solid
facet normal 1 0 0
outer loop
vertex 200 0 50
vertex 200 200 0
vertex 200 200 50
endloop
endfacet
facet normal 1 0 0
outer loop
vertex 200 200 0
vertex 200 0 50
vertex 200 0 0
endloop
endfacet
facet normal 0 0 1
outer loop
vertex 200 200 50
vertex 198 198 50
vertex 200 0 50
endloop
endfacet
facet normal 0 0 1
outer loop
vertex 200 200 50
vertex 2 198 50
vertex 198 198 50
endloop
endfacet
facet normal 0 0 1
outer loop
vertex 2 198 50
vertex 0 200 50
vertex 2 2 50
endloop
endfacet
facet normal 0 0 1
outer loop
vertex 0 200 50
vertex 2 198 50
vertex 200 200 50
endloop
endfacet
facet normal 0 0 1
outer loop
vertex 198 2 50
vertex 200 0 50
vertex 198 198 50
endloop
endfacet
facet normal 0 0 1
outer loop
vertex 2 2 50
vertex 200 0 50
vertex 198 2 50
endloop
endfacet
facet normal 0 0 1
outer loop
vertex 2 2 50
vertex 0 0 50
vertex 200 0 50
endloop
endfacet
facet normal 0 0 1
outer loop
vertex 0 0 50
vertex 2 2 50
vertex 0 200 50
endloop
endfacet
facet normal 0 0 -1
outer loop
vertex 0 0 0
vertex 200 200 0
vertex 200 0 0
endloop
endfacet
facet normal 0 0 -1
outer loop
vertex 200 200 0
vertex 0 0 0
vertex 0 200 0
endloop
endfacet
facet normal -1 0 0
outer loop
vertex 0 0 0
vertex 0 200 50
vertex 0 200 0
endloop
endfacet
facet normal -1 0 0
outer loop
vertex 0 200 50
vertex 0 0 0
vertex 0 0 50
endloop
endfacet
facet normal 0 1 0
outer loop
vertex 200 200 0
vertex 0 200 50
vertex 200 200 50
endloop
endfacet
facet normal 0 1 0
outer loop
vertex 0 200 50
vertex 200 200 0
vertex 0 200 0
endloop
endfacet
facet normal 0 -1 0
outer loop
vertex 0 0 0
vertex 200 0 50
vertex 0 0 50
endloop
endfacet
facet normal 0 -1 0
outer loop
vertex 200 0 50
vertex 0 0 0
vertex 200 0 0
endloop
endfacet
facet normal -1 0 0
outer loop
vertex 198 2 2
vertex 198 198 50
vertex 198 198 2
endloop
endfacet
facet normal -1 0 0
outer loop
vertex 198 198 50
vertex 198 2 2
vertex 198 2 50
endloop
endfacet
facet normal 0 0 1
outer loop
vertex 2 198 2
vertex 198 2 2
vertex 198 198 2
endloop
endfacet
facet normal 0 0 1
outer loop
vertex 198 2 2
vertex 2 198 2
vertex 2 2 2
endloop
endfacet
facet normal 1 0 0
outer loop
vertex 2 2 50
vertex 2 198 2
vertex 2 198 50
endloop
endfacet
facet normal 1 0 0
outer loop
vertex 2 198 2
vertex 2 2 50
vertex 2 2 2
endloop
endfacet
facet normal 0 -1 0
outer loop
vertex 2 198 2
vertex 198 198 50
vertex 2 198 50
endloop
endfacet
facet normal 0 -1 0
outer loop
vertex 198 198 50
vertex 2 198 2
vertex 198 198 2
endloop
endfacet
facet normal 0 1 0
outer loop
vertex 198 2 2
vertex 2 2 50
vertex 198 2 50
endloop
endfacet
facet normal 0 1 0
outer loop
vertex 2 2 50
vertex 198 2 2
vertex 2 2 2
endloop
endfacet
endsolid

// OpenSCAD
// file: SortBox.scad
/*

    Storage box
    
    By Anton Augustsson
    
    
*/



module SortBox (widthUnit,lenghtUnit){


// ---------- Constant varables ----------
u=50;
height=u;
wallThickness=2;
    
width=widthUnit*u;
lenght=lenghtUnit*u;
    
inerWidth=(width-wallThickness*2);
inerLenght=(lenght-wallThickness*2);


// ---------- Code ---------- 
difference() {
cube(size = [
    width,
    lenght,
    height]);

translate([
    wallThickness,    // Centering
    wallThickness, 
    wallThickness
    ]) 
cube(size = [
    inerWidth,
    inerLenght,
    height]);
}}

// ---------- Example ---------- 
SortBox (4,4);
// main file
/*

    Storage box
    
    By Anton Augustsson
    
    
*/


// import module
use <SortBox.scad>;

SortBox (4,4);
